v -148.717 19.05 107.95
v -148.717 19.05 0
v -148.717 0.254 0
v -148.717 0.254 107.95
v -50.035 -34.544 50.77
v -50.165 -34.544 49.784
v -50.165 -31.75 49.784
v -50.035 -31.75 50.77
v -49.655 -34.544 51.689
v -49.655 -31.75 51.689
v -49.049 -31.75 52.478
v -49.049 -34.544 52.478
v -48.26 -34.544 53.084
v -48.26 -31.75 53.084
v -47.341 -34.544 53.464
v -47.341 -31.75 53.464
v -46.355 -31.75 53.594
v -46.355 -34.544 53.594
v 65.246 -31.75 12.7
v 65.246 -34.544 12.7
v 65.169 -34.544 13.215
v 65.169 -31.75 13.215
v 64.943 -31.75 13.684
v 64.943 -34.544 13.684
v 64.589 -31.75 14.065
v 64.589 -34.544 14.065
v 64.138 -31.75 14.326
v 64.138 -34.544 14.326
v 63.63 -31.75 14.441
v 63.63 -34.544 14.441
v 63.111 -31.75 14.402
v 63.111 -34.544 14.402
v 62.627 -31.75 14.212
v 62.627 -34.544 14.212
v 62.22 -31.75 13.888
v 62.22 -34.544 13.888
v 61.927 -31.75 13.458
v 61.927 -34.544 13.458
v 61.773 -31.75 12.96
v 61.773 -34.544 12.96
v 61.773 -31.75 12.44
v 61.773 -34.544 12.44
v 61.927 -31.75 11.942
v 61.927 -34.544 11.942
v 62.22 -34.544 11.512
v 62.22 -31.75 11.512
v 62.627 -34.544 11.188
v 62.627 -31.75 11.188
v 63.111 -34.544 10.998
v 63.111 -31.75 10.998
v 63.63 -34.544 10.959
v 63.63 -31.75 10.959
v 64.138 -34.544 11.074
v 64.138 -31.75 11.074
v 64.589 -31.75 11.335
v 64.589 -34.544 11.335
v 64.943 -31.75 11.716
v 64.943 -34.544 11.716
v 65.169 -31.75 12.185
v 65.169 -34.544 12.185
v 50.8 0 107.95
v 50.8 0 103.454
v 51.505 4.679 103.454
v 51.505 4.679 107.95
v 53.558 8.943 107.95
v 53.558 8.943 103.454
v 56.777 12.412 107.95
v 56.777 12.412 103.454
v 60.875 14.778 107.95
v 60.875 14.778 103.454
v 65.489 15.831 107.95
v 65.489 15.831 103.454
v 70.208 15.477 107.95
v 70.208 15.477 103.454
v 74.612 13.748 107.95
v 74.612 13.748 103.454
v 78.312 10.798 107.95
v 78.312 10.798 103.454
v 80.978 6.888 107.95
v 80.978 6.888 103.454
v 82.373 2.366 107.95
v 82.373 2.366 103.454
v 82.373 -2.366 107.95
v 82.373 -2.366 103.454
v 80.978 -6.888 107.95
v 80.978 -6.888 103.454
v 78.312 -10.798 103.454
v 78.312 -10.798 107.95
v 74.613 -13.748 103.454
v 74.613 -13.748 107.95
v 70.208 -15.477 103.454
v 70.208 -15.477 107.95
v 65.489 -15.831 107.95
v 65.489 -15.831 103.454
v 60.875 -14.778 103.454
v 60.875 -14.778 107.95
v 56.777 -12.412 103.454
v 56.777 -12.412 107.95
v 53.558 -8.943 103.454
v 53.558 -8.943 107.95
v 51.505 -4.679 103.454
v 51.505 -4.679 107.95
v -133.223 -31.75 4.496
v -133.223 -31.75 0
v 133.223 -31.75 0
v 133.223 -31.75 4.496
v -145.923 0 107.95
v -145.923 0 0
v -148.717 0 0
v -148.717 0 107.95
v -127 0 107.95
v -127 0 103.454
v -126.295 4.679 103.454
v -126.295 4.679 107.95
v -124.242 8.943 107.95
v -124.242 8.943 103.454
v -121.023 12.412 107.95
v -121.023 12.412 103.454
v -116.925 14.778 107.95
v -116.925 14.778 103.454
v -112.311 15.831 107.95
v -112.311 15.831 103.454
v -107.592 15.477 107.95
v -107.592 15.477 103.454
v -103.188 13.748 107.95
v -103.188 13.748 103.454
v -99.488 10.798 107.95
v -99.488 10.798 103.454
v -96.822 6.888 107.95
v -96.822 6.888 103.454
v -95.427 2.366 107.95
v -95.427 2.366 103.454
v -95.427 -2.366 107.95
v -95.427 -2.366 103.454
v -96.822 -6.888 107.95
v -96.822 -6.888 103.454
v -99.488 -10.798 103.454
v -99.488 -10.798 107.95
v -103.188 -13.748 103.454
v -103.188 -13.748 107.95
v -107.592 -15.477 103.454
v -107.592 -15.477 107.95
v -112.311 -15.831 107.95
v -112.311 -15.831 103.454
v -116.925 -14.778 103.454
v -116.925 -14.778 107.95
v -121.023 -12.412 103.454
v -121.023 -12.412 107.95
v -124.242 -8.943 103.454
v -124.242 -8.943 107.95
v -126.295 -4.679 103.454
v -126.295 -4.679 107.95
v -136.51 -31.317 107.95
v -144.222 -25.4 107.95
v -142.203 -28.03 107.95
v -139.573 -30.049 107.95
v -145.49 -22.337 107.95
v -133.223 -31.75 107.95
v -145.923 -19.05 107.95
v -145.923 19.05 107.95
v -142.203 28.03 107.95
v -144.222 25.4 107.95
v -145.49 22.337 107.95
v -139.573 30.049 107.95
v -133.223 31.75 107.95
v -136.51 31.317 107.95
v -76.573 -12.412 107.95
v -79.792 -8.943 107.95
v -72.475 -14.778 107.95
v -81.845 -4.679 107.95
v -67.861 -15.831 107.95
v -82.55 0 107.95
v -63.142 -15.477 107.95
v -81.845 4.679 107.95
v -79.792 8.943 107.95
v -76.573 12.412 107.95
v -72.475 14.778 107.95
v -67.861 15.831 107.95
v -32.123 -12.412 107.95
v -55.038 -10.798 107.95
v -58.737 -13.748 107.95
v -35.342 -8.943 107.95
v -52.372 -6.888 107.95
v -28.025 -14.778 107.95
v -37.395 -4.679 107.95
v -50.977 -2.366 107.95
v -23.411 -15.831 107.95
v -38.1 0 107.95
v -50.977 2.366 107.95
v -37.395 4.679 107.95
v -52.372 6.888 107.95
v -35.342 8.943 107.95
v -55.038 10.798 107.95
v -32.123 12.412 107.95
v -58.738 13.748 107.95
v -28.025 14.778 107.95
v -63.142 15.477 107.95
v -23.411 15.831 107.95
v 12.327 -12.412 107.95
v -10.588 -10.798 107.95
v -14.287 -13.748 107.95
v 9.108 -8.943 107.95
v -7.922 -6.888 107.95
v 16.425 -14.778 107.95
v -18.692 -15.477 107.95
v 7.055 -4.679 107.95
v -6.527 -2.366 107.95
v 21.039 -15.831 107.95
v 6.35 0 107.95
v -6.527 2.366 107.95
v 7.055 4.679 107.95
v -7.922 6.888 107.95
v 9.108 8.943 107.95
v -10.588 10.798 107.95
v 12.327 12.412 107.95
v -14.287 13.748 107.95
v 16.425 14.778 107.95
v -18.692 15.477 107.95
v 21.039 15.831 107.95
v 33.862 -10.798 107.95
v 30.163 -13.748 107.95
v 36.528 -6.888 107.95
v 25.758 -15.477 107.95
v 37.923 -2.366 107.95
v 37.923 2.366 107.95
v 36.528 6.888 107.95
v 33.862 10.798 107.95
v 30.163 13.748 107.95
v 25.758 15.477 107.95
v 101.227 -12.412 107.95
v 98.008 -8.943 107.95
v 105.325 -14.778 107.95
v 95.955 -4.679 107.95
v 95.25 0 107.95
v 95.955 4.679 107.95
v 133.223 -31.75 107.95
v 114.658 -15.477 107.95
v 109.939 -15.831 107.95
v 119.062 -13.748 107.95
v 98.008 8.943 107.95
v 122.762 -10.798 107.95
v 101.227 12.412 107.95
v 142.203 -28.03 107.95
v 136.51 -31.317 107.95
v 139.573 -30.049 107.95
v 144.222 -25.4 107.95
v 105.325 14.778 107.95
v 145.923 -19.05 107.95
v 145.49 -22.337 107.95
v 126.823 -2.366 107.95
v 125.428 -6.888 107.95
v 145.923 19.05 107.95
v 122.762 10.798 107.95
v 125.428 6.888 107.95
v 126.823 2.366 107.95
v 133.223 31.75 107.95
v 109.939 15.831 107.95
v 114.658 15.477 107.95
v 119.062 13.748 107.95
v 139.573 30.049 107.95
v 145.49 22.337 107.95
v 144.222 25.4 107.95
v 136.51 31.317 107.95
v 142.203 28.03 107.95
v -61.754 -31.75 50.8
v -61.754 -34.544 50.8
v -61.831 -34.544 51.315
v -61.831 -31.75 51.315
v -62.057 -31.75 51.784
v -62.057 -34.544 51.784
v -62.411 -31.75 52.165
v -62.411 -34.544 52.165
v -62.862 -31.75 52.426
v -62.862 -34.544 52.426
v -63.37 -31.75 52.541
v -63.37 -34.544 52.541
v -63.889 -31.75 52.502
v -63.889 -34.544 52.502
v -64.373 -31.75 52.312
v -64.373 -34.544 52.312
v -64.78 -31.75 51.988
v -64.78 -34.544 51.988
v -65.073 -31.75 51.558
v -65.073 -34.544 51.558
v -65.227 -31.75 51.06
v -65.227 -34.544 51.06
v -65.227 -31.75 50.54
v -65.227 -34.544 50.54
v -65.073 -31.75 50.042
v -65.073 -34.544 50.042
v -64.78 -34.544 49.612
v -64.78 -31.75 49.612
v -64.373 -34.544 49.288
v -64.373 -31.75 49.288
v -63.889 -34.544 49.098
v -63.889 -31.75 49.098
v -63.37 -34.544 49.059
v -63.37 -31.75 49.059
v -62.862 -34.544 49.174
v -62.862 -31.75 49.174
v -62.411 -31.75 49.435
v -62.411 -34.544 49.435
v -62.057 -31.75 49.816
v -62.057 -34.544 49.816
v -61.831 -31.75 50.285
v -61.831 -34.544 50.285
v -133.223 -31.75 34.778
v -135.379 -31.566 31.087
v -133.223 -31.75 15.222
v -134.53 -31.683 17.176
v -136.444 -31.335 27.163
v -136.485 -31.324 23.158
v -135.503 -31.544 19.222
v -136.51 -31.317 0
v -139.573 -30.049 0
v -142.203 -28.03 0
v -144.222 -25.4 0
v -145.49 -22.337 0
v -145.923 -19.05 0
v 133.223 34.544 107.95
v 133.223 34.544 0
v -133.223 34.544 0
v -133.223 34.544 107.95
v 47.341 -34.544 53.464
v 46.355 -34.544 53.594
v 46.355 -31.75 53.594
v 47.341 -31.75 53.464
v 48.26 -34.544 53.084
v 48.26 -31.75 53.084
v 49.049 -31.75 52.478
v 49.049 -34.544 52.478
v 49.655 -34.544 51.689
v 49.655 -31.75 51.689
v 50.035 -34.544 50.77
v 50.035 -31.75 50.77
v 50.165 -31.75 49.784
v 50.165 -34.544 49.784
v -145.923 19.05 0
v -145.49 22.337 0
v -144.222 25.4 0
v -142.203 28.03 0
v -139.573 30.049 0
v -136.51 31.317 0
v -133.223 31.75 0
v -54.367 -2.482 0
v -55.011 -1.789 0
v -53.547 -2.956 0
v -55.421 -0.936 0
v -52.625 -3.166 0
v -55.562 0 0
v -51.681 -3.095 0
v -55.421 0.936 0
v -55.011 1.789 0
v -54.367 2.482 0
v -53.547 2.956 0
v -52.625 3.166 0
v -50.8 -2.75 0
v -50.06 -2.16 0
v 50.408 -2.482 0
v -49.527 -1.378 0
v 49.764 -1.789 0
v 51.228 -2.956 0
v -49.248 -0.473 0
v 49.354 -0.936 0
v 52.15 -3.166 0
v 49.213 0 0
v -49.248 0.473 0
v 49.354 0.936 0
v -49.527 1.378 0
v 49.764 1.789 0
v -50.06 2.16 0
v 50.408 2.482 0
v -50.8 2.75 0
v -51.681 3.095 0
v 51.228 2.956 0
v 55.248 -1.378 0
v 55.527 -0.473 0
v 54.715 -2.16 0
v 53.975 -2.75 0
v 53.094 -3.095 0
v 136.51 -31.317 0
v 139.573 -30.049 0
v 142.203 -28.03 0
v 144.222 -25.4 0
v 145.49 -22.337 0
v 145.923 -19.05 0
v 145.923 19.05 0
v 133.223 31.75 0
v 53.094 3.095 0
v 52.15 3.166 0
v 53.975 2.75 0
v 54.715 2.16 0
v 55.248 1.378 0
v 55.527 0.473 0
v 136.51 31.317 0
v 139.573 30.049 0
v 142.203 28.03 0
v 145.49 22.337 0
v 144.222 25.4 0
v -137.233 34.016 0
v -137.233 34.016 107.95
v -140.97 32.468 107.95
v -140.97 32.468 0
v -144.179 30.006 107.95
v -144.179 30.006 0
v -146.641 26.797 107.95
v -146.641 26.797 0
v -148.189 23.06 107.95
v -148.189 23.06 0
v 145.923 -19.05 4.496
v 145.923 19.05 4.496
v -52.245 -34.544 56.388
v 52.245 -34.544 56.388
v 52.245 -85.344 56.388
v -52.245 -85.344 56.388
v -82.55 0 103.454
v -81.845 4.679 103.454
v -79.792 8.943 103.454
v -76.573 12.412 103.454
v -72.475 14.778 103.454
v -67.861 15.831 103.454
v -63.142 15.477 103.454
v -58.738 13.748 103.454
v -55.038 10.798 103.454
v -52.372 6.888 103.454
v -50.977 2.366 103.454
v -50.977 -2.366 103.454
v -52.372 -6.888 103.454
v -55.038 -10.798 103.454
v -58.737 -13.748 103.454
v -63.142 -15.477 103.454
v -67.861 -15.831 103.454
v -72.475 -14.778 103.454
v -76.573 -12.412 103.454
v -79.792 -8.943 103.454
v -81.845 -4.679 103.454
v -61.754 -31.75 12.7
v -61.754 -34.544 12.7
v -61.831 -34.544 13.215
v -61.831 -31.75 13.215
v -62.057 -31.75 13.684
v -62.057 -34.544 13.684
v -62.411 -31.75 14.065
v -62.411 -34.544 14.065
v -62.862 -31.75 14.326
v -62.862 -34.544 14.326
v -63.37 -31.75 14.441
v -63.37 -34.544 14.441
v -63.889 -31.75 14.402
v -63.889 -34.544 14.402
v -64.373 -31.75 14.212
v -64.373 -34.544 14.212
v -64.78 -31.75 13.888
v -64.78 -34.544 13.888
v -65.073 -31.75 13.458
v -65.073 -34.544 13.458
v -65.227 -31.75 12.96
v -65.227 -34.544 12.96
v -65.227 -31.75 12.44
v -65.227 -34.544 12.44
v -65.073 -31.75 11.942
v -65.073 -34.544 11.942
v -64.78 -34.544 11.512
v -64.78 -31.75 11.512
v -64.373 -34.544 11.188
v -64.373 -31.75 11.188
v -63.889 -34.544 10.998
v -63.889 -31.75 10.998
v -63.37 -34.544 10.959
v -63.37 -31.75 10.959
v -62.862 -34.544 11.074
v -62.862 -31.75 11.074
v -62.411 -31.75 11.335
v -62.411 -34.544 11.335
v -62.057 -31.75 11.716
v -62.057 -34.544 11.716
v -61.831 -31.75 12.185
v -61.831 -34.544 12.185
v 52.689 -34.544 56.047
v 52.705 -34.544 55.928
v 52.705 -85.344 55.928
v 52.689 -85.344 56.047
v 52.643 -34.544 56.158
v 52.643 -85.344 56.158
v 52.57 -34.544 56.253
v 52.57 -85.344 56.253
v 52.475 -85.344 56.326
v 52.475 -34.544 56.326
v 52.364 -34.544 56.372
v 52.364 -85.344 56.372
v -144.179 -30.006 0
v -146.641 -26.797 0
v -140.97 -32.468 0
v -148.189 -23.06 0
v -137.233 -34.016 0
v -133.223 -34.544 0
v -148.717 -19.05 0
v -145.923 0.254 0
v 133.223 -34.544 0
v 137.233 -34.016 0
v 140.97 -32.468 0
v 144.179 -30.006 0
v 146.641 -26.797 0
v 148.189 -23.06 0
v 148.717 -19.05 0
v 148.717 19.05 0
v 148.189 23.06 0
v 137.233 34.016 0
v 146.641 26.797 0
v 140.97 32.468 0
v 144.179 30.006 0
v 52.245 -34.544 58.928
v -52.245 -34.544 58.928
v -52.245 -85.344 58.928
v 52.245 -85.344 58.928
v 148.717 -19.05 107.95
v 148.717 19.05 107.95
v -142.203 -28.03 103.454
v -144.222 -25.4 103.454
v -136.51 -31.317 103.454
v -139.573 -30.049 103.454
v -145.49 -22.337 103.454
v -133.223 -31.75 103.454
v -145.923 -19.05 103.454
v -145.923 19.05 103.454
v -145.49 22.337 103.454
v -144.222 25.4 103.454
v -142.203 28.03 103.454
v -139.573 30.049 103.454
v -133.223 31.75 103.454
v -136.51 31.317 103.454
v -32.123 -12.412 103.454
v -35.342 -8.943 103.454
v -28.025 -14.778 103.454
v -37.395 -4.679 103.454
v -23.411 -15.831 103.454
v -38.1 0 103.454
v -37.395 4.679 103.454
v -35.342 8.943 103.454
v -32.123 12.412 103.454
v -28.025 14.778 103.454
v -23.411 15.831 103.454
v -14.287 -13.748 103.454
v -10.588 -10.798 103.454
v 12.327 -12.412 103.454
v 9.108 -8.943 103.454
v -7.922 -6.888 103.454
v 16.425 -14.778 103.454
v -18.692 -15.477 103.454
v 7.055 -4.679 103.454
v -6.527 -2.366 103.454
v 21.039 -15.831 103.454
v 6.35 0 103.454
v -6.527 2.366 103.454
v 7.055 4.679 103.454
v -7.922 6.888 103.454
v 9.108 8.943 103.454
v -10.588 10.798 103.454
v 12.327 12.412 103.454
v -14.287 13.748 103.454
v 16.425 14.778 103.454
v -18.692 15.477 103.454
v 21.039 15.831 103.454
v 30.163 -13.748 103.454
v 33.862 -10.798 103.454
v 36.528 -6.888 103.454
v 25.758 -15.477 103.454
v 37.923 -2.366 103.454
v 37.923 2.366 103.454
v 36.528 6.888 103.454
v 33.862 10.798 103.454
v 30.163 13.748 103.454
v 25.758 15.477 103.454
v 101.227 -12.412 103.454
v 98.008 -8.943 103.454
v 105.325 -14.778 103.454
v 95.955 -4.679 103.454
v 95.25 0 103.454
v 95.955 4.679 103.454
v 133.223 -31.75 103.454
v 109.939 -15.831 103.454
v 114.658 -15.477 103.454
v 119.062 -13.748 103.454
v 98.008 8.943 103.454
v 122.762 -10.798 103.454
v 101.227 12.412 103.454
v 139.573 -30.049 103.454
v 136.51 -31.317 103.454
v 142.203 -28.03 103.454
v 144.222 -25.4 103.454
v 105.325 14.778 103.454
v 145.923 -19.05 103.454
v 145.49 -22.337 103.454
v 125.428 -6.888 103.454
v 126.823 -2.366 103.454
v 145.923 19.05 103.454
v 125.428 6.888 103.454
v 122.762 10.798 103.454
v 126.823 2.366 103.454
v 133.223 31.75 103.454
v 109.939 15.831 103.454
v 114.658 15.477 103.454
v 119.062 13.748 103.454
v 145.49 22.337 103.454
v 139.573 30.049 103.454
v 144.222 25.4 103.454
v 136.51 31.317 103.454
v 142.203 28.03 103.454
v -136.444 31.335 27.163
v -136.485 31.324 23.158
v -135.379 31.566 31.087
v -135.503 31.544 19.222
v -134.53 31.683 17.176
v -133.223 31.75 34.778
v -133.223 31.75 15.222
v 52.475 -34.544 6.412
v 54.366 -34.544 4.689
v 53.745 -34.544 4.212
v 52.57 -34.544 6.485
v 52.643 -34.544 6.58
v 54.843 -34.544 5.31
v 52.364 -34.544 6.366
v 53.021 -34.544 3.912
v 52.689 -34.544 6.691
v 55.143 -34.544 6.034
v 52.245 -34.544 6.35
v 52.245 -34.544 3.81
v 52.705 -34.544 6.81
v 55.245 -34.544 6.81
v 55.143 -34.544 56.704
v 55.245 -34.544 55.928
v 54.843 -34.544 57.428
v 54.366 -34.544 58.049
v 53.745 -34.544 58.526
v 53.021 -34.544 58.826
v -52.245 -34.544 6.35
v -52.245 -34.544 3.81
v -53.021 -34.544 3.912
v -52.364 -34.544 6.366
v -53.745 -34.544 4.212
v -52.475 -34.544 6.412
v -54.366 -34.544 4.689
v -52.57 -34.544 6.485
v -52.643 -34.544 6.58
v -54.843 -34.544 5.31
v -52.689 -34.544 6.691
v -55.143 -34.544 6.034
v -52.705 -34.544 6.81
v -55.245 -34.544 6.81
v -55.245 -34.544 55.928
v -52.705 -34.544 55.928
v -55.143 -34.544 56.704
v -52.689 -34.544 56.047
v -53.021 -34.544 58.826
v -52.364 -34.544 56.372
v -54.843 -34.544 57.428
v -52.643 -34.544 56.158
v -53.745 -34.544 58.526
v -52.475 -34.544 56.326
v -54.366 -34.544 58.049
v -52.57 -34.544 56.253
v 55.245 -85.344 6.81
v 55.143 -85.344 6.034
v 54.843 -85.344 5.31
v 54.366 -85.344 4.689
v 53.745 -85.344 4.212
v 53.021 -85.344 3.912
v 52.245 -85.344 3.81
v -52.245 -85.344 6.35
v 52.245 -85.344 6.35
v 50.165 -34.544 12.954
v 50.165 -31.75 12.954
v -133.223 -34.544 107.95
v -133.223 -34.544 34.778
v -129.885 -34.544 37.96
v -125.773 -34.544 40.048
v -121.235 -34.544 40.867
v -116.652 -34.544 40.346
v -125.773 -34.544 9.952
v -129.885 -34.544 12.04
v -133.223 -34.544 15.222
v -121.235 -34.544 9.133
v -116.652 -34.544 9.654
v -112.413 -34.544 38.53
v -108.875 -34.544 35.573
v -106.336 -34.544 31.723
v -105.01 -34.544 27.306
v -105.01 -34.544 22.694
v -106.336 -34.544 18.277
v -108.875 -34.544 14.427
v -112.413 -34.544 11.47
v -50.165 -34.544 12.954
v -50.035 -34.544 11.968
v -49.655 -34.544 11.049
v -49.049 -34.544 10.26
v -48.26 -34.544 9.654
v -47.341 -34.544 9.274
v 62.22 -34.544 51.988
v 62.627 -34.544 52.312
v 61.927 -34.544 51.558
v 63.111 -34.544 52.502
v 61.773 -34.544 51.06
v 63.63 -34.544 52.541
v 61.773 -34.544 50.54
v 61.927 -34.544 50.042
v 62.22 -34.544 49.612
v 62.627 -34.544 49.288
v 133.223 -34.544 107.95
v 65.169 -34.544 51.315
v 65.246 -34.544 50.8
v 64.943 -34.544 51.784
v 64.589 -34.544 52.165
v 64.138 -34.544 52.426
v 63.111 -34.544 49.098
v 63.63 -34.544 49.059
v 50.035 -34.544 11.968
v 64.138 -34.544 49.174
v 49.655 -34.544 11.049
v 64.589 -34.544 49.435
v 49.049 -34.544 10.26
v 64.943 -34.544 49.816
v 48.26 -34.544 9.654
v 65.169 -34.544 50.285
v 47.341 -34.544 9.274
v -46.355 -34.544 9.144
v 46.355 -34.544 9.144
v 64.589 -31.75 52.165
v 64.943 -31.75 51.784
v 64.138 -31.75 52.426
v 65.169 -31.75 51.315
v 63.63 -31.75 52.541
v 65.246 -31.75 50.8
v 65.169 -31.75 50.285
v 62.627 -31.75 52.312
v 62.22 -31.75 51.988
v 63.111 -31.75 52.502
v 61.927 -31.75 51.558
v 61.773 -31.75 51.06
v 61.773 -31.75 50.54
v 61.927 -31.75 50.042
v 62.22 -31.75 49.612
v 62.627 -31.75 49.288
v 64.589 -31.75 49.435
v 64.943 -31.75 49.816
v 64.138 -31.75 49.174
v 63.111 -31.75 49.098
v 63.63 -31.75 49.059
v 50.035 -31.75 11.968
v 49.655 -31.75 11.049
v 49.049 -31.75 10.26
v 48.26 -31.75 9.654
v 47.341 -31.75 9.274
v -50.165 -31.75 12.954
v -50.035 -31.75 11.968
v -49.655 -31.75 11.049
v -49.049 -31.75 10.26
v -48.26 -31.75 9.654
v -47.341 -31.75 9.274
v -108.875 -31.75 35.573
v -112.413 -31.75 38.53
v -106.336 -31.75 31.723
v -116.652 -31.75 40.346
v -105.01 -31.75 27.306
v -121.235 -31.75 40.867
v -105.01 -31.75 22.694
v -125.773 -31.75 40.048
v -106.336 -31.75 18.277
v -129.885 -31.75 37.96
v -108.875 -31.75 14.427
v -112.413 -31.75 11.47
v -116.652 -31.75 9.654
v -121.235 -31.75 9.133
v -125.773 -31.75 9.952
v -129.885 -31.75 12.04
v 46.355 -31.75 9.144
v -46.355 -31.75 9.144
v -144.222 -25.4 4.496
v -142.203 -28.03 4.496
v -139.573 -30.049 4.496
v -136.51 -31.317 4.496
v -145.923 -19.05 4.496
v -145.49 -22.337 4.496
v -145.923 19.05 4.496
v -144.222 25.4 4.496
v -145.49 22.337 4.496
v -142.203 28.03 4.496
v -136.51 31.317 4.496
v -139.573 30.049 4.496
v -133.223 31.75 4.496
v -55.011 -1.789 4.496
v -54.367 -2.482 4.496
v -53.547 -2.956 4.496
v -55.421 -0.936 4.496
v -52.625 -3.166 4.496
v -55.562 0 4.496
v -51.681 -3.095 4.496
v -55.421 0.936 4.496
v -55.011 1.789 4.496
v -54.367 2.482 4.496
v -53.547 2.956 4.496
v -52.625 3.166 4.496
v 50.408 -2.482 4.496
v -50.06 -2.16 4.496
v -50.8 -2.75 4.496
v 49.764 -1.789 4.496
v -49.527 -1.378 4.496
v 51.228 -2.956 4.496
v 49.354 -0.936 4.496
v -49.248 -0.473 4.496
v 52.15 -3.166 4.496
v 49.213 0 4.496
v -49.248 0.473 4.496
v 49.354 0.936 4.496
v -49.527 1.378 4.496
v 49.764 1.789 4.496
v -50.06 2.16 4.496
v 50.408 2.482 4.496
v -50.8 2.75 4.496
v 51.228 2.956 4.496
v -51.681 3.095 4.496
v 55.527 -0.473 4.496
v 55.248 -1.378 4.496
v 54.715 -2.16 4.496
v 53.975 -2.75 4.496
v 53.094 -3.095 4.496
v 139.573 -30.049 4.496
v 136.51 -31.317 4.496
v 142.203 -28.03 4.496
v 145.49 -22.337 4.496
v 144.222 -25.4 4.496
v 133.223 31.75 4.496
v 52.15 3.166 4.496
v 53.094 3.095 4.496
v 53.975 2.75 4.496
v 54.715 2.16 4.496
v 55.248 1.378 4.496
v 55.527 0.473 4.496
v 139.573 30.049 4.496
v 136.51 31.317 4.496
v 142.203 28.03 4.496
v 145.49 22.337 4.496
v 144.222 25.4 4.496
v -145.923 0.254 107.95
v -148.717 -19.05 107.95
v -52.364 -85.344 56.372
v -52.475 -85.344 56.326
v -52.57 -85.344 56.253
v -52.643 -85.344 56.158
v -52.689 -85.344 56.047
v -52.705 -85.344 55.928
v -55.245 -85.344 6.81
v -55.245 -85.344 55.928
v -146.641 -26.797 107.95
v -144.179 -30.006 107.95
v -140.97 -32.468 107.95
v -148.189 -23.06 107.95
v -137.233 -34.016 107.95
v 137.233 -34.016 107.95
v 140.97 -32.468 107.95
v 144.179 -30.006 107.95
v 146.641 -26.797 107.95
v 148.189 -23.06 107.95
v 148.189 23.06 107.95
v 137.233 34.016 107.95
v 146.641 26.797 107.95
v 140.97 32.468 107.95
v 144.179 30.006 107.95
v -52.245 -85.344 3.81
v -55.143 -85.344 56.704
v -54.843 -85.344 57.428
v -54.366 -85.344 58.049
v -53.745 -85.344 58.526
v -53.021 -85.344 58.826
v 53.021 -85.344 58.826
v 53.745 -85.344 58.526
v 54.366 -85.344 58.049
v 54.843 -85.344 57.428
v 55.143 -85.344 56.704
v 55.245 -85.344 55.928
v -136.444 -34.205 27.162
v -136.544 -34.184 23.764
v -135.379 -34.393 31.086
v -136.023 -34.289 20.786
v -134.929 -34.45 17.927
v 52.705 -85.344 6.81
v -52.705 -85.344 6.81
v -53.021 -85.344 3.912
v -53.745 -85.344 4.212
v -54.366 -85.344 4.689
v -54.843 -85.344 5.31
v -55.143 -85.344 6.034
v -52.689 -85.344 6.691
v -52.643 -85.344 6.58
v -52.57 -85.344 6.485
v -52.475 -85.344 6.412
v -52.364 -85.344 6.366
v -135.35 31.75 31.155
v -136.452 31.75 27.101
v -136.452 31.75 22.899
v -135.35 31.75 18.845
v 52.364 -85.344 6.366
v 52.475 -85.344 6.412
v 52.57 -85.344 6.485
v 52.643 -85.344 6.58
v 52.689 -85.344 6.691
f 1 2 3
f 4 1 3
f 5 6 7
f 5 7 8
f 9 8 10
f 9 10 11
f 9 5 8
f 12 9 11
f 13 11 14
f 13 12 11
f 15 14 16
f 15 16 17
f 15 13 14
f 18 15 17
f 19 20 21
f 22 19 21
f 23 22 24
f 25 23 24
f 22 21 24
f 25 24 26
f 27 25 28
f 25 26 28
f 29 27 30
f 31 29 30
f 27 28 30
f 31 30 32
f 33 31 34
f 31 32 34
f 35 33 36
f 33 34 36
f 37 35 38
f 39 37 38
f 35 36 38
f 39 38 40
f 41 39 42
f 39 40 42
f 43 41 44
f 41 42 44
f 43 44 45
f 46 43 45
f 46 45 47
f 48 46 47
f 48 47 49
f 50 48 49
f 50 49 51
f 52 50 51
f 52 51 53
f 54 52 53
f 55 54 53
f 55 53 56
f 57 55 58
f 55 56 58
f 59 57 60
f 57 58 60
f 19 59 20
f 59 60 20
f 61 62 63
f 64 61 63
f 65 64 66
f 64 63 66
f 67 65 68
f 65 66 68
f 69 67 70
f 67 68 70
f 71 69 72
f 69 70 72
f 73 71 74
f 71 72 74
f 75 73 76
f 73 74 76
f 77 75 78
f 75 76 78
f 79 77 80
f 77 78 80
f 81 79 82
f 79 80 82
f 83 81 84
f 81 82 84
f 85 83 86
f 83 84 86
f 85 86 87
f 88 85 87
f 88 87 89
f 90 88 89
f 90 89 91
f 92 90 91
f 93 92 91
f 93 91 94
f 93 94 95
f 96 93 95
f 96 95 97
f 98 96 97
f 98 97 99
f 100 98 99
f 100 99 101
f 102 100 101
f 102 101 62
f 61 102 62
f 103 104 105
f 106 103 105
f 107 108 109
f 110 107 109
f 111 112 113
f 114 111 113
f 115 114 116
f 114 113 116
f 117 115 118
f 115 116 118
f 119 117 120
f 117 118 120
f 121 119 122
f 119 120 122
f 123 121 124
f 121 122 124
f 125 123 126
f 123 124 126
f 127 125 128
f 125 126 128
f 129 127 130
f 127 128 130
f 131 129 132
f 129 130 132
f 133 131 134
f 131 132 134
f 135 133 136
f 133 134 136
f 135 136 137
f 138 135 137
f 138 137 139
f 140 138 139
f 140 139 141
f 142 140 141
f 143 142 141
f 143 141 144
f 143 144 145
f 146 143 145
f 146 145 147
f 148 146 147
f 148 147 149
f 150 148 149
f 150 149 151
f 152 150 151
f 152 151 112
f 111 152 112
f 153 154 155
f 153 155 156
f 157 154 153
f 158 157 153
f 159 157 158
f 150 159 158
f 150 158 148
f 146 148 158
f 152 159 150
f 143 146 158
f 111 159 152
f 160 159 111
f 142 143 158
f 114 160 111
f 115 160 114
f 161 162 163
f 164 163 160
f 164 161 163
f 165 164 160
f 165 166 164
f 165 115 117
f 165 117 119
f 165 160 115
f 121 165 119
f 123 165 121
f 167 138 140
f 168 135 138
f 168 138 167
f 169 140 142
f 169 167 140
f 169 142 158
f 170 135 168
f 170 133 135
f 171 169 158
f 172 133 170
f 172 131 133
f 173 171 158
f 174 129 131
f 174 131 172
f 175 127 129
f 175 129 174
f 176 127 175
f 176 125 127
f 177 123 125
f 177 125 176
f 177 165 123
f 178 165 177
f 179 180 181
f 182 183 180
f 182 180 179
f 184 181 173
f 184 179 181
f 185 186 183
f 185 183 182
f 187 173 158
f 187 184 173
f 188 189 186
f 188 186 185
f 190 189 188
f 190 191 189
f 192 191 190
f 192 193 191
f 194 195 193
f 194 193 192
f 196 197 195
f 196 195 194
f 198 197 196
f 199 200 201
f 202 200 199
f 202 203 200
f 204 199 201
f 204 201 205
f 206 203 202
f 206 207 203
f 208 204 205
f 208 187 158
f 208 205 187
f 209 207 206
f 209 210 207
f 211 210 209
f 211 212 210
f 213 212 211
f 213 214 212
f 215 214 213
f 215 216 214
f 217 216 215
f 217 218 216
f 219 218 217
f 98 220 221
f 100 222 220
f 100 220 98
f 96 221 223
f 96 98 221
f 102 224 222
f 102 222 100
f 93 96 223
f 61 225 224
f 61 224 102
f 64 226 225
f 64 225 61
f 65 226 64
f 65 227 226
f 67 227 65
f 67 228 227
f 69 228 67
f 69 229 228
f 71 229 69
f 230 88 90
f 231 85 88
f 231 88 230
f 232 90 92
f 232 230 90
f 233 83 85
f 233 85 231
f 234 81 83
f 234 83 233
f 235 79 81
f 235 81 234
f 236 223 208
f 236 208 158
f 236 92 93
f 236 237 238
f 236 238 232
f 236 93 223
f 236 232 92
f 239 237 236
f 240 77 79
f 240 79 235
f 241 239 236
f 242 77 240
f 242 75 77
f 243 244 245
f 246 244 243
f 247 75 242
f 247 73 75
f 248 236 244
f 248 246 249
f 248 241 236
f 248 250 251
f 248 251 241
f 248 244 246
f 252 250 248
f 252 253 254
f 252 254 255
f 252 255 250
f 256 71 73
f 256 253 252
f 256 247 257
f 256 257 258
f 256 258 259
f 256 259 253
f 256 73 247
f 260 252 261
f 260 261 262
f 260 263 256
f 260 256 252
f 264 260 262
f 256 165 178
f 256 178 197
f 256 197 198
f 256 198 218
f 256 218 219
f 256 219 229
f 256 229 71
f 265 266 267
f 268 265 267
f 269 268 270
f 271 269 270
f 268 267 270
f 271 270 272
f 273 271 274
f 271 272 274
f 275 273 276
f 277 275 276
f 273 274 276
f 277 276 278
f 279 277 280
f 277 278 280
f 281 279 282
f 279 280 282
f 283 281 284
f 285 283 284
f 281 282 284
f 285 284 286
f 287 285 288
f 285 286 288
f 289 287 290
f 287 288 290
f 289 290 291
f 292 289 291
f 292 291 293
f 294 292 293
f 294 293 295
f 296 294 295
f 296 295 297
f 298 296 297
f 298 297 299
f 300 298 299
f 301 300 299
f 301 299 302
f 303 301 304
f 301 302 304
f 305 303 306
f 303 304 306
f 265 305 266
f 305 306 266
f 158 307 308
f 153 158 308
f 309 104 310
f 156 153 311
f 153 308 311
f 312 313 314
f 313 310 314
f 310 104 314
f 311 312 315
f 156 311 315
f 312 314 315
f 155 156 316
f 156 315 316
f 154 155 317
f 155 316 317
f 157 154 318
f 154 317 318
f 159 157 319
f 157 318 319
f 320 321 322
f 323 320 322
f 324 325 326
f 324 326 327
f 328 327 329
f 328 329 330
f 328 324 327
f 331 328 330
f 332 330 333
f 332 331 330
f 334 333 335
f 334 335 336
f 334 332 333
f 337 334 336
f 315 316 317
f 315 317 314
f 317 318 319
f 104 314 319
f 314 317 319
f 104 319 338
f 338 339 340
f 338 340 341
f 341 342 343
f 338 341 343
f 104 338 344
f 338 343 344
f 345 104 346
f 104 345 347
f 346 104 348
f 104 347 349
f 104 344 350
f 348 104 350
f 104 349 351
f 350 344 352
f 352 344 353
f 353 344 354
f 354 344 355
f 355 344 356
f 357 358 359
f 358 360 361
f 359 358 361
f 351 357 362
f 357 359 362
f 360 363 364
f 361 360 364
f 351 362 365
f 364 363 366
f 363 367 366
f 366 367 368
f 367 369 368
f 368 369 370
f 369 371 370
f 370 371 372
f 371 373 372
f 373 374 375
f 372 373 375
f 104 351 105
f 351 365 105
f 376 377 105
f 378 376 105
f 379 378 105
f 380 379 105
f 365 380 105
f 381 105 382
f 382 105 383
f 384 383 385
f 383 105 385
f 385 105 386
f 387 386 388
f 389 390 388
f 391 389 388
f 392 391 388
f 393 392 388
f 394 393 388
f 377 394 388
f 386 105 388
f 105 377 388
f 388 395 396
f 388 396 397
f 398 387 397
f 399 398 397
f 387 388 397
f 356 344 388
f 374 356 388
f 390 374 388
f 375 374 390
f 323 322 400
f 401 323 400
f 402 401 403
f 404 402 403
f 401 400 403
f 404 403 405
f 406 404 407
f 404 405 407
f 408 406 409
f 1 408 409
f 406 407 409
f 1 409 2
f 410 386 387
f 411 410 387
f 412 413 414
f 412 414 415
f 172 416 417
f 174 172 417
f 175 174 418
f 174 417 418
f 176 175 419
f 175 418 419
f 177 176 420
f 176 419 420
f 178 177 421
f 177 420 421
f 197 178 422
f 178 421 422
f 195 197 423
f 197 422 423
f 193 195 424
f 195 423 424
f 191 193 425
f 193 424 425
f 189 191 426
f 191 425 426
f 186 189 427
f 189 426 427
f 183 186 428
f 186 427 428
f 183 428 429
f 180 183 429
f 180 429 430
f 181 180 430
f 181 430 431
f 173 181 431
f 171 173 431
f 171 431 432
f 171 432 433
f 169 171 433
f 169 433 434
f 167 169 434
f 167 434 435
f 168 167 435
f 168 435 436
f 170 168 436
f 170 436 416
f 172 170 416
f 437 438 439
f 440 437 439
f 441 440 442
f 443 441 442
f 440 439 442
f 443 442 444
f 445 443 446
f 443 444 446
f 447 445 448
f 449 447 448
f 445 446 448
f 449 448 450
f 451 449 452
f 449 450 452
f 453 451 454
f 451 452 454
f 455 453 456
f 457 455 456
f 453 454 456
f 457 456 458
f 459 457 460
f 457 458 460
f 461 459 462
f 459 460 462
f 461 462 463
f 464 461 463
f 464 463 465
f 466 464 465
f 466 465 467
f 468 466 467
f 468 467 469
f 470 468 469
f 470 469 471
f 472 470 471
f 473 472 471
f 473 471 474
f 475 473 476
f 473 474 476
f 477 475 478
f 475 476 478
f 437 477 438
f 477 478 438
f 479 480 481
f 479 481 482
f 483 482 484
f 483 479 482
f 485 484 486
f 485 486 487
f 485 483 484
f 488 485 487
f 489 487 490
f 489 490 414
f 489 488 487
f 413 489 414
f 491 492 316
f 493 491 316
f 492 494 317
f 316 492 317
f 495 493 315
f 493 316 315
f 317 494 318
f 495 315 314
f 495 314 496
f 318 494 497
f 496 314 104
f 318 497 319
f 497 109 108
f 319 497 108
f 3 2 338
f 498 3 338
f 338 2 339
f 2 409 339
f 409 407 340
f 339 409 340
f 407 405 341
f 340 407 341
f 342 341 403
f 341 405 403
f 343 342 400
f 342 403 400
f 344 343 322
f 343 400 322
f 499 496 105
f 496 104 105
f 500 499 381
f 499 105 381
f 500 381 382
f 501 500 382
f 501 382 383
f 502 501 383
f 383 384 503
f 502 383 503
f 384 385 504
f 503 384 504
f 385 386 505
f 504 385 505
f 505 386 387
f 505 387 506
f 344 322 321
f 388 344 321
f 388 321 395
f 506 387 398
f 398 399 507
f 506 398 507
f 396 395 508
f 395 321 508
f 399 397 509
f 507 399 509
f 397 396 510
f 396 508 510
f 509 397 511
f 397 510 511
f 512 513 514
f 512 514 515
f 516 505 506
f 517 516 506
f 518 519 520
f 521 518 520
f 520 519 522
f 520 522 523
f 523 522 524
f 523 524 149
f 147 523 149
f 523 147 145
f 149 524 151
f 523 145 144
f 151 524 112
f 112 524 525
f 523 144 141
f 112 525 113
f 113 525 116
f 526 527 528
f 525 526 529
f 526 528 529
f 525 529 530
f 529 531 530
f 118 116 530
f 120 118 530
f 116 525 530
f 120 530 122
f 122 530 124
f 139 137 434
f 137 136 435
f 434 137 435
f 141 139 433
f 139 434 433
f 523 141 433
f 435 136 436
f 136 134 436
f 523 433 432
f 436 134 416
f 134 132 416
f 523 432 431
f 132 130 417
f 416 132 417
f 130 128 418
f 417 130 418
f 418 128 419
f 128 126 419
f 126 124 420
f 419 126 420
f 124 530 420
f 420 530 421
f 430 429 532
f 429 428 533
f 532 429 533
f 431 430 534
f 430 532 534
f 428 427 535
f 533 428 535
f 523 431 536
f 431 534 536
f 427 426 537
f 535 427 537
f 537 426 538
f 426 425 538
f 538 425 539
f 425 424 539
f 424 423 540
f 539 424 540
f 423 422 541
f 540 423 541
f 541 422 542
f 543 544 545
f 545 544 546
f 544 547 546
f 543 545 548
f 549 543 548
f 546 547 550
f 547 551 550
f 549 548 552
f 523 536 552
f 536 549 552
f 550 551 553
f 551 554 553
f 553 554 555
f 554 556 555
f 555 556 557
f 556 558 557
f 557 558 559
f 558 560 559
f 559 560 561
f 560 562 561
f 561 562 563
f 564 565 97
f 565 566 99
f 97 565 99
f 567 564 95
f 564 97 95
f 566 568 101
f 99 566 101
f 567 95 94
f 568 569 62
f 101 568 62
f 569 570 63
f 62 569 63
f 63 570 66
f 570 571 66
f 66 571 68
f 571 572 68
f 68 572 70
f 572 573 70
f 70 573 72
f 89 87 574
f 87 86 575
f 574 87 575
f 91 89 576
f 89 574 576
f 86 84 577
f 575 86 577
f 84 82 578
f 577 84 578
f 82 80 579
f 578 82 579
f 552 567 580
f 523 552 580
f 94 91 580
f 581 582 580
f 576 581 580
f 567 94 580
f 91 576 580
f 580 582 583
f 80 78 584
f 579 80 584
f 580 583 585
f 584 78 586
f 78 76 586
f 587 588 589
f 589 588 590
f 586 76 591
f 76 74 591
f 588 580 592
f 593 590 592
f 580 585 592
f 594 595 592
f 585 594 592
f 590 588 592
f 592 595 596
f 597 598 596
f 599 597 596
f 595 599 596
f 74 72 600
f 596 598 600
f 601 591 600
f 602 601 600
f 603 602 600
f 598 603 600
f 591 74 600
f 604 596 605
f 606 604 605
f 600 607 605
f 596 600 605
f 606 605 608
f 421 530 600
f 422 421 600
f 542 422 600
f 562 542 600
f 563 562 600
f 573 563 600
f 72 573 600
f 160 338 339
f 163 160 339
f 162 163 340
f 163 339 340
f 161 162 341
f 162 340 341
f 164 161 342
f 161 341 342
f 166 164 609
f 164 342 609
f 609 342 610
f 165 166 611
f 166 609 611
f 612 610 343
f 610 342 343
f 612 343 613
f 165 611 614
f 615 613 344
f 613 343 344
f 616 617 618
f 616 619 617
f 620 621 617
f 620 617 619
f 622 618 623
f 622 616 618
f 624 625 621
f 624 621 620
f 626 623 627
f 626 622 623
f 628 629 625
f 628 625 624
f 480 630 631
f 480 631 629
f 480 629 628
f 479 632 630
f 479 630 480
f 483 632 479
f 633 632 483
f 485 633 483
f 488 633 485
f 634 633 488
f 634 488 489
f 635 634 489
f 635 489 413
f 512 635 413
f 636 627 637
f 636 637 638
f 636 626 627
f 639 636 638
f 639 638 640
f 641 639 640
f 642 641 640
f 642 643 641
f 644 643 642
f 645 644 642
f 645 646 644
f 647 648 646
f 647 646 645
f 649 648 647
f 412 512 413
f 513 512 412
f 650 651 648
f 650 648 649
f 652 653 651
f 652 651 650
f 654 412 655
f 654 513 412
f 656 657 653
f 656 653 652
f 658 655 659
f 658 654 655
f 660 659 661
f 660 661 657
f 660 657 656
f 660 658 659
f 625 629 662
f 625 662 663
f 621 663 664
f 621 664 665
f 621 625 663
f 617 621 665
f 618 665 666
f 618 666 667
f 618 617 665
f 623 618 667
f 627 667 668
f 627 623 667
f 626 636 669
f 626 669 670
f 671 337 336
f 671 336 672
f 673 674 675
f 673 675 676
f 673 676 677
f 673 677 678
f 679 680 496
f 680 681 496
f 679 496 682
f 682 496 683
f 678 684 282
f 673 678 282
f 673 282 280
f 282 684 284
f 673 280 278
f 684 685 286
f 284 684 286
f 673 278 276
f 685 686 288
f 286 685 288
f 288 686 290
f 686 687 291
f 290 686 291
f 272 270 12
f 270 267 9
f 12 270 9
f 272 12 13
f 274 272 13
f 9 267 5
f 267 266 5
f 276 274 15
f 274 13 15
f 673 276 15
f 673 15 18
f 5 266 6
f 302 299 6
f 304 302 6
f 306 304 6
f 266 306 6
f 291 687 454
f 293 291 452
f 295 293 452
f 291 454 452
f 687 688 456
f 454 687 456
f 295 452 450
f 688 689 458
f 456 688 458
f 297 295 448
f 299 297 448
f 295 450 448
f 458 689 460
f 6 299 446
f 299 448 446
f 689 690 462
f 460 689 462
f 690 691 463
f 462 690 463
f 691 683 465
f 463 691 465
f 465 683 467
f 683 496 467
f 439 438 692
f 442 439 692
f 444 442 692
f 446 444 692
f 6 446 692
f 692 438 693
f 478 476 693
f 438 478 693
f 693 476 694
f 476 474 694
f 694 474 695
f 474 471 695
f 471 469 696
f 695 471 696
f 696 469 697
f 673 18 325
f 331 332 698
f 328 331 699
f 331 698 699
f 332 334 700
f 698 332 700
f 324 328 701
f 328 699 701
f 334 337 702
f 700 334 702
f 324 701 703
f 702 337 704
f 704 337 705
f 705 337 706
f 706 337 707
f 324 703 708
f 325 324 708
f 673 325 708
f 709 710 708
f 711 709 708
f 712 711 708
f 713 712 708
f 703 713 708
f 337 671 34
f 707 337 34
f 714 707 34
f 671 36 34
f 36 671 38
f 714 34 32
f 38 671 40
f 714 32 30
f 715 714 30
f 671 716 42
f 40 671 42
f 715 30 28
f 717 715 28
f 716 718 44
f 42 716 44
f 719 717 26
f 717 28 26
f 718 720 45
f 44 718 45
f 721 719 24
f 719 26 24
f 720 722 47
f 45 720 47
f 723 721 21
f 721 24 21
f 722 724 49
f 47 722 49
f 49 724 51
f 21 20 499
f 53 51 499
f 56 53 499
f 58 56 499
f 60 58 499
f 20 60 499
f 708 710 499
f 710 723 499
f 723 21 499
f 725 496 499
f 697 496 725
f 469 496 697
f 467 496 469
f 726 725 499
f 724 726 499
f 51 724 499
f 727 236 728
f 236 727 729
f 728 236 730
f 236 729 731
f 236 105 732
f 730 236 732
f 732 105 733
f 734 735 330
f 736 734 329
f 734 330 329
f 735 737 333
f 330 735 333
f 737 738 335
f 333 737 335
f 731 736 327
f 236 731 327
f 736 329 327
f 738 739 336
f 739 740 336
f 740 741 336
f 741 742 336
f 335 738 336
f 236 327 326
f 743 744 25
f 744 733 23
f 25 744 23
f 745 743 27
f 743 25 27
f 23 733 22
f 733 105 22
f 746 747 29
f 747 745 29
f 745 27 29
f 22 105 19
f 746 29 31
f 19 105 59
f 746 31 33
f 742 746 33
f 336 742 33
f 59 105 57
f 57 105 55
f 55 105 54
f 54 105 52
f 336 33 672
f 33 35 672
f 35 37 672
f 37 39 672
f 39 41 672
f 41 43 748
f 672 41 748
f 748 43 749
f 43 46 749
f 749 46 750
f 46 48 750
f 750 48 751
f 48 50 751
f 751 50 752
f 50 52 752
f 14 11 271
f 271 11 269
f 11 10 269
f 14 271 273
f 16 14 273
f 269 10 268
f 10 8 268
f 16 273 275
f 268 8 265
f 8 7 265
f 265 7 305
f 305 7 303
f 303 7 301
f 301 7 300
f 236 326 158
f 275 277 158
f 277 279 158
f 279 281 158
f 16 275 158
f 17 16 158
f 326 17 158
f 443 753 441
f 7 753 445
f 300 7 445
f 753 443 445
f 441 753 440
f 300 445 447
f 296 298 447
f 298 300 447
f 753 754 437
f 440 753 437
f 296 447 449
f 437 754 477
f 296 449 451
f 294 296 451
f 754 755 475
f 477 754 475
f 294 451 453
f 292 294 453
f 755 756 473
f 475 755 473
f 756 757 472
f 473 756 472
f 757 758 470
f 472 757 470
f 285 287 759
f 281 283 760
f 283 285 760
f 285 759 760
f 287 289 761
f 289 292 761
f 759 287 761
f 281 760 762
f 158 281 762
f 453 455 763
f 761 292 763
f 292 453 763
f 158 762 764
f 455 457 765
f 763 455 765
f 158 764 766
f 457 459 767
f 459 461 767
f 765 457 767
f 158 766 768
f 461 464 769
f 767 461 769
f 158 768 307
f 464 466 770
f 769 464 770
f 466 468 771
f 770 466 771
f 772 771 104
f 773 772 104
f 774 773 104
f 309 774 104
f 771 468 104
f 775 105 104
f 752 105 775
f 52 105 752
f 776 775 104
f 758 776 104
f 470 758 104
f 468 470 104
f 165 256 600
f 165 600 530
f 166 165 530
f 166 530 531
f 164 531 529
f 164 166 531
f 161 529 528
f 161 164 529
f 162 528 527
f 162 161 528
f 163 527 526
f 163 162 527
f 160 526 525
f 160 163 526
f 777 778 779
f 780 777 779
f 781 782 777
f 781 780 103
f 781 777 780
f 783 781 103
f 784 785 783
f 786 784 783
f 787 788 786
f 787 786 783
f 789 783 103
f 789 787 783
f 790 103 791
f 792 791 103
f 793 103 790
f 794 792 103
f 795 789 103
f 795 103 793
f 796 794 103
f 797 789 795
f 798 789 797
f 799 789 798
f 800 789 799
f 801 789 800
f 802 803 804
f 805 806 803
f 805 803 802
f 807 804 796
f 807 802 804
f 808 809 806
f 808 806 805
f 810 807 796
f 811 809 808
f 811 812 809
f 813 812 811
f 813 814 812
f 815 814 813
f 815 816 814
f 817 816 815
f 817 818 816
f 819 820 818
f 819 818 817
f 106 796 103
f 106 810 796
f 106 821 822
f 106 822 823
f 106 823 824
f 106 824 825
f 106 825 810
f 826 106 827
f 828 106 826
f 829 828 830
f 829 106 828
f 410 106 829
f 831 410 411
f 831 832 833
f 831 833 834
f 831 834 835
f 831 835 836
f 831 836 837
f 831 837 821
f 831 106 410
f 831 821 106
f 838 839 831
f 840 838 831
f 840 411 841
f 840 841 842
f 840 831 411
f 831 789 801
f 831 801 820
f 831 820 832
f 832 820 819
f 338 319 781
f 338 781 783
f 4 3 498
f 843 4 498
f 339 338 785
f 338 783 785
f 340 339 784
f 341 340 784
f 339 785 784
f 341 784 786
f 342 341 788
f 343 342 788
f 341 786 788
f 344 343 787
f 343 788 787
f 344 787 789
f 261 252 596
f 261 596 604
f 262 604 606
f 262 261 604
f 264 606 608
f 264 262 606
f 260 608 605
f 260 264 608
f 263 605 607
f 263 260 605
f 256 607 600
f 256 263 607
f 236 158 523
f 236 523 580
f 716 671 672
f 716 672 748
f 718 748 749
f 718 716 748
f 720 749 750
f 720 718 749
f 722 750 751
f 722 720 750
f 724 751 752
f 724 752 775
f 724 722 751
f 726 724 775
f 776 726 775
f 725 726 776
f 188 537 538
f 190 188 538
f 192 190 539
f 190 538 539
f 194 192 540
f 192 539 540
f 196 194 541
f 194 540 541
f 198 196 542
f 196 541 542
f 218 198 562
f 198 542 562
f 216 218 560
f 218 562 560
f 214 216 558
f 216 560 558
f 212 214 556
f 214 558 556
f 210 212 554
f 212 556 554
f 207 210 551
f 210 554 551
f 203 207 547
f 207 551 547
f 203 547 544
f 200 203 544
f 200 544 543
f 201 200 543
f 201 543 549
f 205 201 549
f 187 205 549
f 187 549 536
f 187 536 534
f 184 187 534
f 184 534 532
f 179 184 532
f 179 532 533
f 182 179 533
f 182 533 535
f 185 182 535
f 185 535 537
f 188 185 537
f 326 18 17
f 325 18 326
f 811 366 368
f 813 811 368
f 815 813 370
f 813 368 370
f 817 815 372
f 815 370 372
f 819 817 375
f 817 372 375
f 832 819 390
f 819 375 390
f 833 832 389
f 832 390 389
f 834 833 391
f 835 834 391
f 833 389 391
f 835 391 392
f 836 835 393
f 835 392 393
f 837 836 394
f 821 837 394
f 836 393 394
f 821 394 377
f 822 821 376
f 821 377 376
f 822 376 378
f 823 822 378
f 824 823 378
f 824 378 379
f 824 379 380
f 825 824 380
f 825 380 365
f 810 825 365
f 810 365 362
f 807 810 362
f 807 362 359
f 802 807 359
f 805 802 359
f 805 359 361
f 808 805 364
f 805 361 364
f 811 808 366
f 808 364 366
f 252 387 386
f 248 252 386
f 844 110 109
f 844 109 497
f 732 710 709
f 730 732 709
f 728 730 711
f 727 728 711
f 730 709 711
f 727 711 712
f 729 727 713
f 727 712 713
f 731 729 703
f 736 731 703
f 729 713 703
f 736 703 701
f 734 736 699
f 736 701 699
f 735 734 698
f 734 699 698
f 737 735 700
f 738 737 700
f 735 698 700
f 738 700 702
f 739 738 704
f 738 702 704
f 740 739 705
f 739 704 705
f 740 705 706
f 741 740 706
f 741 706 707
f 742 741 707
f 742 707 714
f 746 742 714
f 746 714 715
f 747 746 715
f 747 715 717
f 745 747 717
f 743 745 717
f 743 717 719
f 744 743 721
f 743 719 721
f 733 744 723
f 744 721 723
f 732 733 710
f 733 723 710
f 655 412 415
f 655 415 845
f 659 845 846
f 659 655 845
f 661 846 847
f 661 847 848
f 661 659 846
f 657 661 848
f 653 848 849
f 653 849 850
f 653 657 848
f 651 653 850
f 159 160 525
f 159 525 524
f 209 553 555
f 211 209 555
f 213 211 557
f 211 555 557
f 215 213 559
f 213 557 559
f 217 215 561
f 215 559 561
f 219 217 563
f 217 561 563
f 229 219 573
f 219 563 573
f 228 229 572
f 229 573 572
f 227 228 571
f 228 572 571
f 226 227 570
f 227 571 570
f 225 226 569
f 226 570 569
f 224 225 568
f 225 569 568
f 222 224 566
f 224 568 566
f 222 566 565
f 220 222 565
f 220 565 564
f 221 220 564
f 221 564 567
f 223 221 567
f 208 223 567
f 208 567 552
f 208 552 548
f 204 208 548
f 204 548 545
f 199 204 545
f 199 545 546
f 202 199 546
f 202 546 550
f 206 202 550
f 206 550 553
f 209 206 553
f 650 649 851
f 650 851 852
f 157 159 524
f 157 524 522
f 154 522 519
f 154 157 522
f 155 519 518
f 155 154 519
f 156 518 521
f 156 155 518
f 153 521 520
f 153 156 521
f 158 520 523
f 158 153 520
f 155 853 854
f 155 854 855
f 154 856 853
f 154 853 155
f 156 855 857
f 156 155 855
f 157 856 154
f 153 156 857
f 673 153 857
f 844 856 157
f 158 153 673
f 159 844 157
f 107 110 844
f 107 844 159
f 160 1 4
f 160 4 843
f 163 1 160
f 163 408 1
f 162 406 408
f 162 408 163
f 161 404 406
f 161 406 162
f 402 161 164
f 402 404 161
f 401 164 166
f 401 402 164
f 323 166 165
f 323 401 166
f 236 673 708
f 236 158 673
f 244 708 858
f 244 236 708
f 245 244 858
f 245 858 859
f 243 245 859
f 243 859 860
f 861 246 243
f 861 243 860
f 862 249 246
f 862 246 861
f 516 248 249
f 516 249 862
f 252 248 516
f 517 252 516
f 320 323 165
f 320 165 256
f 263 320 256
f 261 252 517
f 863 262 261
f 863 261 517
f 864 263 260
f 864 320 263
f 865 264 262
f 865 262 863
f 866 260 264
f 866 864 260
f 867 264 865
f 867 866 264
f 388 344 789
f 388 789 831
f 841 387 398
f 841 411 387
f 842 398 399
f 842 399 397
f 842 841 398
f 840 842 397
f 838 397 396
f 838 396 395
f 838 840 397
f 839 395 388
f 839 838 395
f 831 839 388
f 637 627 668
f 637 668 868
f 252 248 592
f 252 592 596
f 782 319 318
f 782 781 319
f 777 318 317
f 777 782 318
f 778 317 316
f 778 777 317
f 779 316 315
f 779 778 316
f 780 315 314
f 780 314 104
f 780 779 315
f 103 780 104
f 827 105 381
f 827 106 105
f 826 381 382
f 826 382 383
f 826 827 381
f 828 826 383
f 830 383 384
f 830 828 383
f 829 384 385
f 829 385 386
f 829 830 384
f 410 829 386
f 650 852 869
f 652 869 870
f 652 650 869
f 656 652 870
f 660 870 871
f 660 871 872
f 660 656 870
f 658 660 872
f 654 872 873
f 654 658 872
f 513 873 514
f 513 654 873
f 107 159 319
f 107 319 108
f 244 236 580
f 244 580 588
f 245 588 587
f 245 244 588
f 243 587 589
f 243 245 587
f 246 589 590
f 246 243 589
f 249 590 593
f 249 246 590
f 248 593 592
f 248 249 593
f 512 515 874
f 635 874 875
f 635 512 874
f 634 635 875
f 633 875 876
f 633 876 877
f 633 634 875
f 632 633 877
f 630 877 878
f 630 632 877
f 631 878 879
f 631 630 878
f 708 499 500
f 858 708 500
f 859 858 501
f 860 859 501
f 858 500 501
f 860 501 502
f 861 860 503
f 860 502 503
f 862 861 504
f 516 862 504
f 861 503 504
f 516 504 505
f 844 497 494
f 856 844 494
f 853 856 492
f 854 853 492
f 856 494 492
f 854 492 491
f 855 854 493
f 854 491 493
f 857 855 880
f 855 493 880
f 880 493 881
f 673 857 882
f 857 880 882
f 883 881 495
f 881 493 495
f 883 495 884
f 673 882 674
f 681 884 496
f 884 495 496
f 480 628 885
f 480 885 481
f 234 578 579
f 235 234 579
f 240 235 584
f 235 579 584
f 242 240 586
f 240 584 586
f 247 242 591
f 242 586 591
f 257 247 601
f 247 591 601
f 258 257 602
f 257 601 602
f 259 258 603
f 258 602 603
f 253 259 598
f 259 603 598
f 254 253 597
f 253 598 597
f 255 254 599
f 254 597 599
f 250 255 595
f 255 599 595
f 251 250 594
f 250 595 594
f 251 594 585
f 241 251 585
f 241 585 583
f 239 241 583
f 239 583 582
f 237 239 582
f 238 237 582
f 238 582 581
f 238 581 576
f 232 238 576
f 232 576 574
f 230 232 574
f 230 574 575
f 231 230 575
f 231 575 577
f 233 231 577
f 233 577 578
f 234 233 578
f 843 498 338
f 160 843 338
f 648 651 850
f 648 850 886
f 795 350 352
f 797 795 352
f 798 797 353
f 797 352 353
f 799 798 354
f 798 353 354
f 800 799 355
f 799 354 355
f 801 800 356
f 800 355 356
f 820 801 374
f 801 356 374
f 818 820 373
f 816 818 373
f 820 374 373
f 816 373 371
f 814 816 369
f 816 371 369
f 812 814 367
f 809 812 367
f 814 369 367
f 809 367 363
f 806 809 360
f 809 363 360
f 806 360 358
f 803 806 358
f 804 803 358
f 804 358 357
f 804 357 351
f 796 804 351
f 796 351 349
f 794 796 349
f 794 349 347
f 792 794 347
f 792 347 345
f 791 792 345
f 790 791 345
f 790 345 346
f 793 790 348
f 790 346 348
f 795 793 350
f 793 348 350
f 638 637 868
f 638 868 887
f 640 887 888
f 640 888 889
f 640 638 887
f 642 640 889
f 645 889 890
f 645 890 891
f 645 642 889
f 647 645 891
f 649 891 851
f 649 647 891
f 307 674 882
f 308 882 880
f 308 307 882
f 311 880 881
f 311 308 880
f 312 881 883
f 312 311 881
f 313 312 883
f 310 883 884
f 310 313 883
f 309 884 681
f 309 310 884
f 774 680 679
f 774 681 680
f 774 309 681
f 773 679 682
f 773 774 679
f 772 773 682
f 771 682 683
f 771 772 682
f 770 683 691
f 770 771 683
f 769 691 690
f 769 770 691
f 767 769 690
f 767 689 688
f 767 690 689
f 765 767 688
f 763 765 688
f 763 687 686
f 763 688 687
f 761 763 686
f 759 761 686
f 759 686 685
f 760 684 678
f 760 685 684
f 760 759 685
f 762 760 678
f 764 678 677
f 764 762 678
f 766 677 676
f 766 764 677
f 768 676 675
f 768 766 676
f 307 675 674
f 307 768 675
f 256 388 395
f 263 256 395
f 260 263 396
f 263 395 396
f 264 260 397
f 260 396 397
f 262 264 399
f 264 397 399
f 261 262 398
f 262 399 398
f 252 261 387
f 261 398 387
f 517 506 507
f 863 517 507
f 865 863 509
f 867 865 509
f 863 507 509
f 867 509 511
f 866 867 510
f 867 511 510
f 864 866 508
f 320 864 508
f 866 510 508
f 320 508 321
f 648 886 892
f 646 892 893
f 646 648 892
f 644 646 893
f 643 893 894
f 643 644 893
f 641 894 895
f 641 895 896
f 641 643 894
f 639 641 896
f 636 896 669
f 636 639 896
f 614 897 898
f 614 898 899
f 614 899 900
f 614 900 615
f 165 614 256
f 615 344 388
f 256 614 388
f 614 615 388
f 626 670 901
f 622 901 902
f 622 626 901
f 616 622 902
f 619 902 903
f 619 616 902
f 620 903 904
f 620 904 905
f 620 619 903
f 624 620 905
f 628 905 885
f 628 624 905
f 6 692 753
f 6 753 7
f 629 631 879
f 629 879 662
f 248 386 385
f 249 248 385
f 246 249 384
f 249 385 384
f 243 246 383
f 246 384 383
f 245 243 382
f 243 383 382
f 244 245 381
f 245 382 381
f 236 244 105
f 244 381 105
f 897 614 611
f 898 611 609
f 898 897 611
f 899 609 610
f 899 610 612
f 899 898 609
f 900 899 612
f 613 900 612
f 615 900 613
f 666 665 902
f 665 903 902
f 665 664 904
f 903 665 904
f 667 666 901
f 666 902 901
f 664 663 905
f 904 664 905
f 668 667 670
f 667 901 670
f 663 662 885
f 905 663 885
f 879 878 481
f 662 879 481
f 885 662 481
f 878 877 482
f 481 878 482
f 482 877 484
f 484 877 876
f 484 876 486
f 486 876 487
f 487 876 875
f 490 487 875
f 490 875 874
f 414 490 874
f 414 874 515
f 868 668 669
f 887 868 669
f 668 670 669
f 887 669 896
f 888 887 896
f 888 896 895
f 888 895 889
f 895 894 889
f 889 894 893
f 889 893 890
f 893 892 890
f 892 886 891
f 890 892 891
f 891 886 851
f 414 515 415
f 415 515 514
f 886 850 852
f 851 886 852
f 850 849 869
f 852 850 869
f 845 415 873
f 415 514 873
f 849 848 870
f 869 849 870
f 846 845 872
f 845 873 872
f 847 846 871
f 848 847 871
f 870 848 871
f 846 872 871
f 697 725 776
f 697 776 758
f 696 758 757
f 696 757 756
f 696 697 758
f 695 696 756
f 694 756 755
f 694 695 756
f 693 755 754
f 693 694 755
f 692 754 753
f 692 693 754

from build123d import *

# Parameters (mm, degrees)
SKETCH1_W           = 291.846
SKETCH1_H           = 63.5
BOSS_EXTRUDE1_DEPTH = 4.4958
FILLET1_R           = 12.7
BOSS_EXTRUDE2_DEPTH = 107.95
BOSS_EXTRUDE3_DEPTH = 4.4958
SKETCH2_R           = 15.875
CUT_EXTRUDE1_DEPTH  = 187.984589004
BOSS_EXTRUDE5_DEPTH = 50.8
SKETCH7_R           = 3.175
CUT_EXTRUDE2_DEPTH  = 4.4958
CUT_EXTRUDE3_DEPTH  = 2.794
CUT_EXTRUDE4_START  = -66.294
SKETCH9_R           = 15.875
CUT_EXTRUDE4_DEPTH  = 263.617967801
SKETCH10_R          = 1.74625
CUT_EXTRUDE5_DEPTH  = 2.794


with BuildPart() as part:
    # Sketch1 → Boss-Extrude1 (new body)
    with BuildSketch(Plane.XY):
        Rectangle(SKETCH1_W, SKETCH1_H)
    extrude(amount=BOSS_EXTRUDE1_DEPTH)

    # Fillet1
    fillet1_edges = [part.edges().sort_by_distance(p)[0] for p in [
        (145.923, -31.75, 2.2479),
        (-145.923, -31.75, 2.2479),
        (-145.923, 31.75, 2.2479),
        (145.923, 31.75, 2.2479),
    ]]
    fillet(fillet1_edges, radius=FILLET1_R)

    # Sketch7 → Cut-Extrude2 (cut)
    with BuildSketch(Plane(origin=(0, 0, 0), x_dir=(-1, 0, 0), z_dir=(0, 0, -1))):
        with Locations((-52.3875, 0)):
            Circle(SKETCH7_R)
        with Locations((52.3875, 0)):
            Circle(SKETCH7_R)
    extrude(amount=-CUT_EXTRUDE2_DEPTH, mode=Mode.SUBTRACT)


with BuildPart() as body_2:
    # Sketch3 → Boss-Extrude2 (new body)
    with BuildSketch(Plane.XY):
        with BuildLine():
            Line((133.223, 34.544), (-133.223, 34.544))
            ThreePointArc((-133.223, 34.544), (-144.178912468, 30.005912468), (-148.717, 19.05))
            Line((-148.717, 19.05), (-148.717, 0.254))
            Line((-148.717, 0.254), (-145.923, 0.254))
            Line((-145.923, 0.254), (-145.923, 19.05))
            ThreePointArc((-145.923, 19.05), (-142.203256121, 28.030256121), (-133.223, 31.75))
            Line((-133.223, 31.75), (133.223, 31.75))
            ThreePointArc((133.223, 31.75), (142.203256121, 28.030256121), (145.923, 19.05))
            Line((145.923, 19.05), (145.923, -19.05))
            ThreePointArc((145.923, -19.05), (142.203256121, -28.030256121), (133.223, -31.75))
            Line((133.223, -31.75), (-133.223, -31.75))
            ThreePointArc((-133.223, -31.75), (-142.203256121, -28.030256121), (-145.923, -19.05))
            Line((-145.923, -19.05), (-145.923, 0))
            Line((-145.923, 0), (-148.717, 0))
            Line((-148.717, 0), (-148.717, -19.05))
            ThreePointArc((-148.717, -19.05), (-144.178912468, -30.005912468), (-133.223, -34.544))
            Line((-133.223, -34.544), (133.223, -34.544))
            ThreePointArc((133.223, -34.544), (144.178912468, -30.005912468), (148.717, -19.05))
            Line((148.717, -19.05), (148.717, 19.05))
            ThreePointArc((148.717, 19.05), (144.178912468, 30.005912468), (133.223, 34.544))
        make_face()
    extrude(amount=BOSS_EXTRUDE2_DEPTH)

    # Sketch8 → Cut-Extrude3 (cut)
    with BuildSketch(Plane.XZ.offset(34.544)):
        with BuildLine():
            Line((-46.355, 53.594), (46.355, 53.594))
            ThreePointArc((46.355, 53.594), (49.049076836, 52.478076836), (50.165, 49.784))
            Line((50.165, 49.784), (50.165, 12.954))
            ThreePointArc((50.165, 12.954), (49.049076836, 10.259923164), (46.355, 9.144))
            Line((46.355, 9.144), (-46.355, 9.144))
            ThreePointArc((-46.355, 9.144), (-49.049076836, 10.259923164), (-50.165, 12.954))
            Line((-50.165, 12.954), (-50.165, 49.784))
            ThreePointArc((-50.165, 49.784), (-49.049076836, 52.478076836), (-46.355, 53.594))
        make_face()
    extrude(amount=-CUT_EXTRUDE3_DEPTH, mode=Mode.SUBTRACT)

    # Sketch9 → Cut-Extrude4 (cut, through all)
    with BuildSketch(Plane.XZ.offset(34.544).offset(CUT_EXTRUDE4_START)):
        with Locations(Location((-120.717, 25, 0), (0, 0, 141.978486401))):
            Circle(SKETCH9_R)
    extrude(amount=CUT_EXTRUDE4_DEPTH, mode=Mode.SUBTRACT)

    # Sketch10 → Cut-Extrude5 (cut)
    with BuildSketch(Plane.XZ.offset(34.544)):
        with Locations((63.5, 50.8)):
            Circle(SKETCH10_R)
        with Locations((63.5, 12.7)):
            Circle(SKETCH10_R)
        with Locations((-63.5, 50.8)):
            Circle(SKETCH10_R)
        with Locations((-63.5, 12.7)):
            Circle(SKETCH10_R)
    extrude(amount=-CUT_EXTRUDE5_DEPTH, mode=Mode.SUBTRACT)


with BuildPart() as body_3:
    # Sketch4 → Boss-Extrude3 (new body)
    with BuildSketch(Plane.XY.offset(107.95)):
        with BuildLine():
            Line((-145.923, 19.05), (-145.923, -19.05))
            ThreePointArc((-145.923, -19.05), (-142.203256121, -28.030256121), (-133.223, -31.75))
            Line((-133.223, -31.75), (133.223, -31.75))
            ThreePointArc((133.223, -31.75), (142.203256121, -28.030256121), (145.923, -19.05))
            Line((145.923, -19.05), (145.923, 19.05))
            ThreePointArc((145.923, 19.05), (142.203256121, 28.030256121), (133.223, 31.75))
            Line((133.223, 31.75), (-133.223, 31.75))
            ThreePointArc((-133.223, 31.75), (-142.203256121, 28.030256121), (-145.923, 19.05))
        make_face()
    extrude(amount=-BOSS_EXTRUDE3_DEPTH)

    # Sketch2 → Cut-Extrude1 (cut, through all)
    with BuildSketch(Plane(origin=(0, 0, 0), x_dir=(-1, 0, 0), z_dir=(0, 0, -1))):
        with Locations((-111.125, 0)):
            Circle(SKETCH2_R)
        with Locations((-66.675, 0)):
            Circle(SKETCH2_R)
        with Locations((-22.225, 0)):
            Circle(SKETCH2_R)
        with Locations((22.225, 0)):
            Circle(SKETCH2_R)
        with Locations((66.675, 0)):
            Circle(SKETCH2_R)
        with Locations((111.125, 0)):
            Circle(SKETCH2_R)
    extrude(amount=-CUT_EXTRUDE1_DEPTH, mode=Mode.SUBTRACT)


with BuildPart() as body_4:
    # Sketch6 → Boss-Extrude5 (new body)
    with BuildSketch(Plane.XZ.offset(34.544)):
        with BuildLine():
            Line((-52.245, 58.928), (52.245, 58.928))
            ThreePointArc((52.245, 58.928), (54.366320344, 58.049320344), (55.245, 55.928))
            Line((55.245, 55.928), (55.245, 6.81))
            ThreePointArc((55.245, 6.81), (54.366320344, 4.688679656), (52.245, 3.81))
            Line((52.245, 3.81), (-52.245, 3.81))
            ThreePointArc((-52.245, 3.81), (-54.366320344, 4.688679656), (-55.245, 6.81))
            Line((-55.245, 6.81), (-55.245, 55.928))
            ThreePointArc((-55.245, 55.928), (-54.366320344, 58.049320344), (-52.245, 58.928))
        make_face()
        with BuildLine():
            Line((-52.705, 55.928), (-52.705, 6.81))
            ThreePointArc((-52.705, 6.81), (-52.570269119, 6.484730881), (-52.245, 6.35))
            Line((-52.245, 6.35), (52.245, 6.35))
            ThreePointArc((52.245, 6.35), (52.570269119, 6.484730881), (52.705, 6.81))
            Line((52.705, 6.81), (52.705, 55.928))
            ThreePointArc((52.705, 55.928), (52.570269119, 56.253269119), (52.245, 56.388))
            Line((52.245, 56.388), (-52.245, 56.388))
            ThreePointArc((-52.245, 56.388), (-52.570269119, 56.253269119), (-52.705, 55.928))
        make_face(mode=Mode.SUBTRACT)
    extrude(amount=BOSS_EXTRUDE5_DEPTH)


solid = Compound([part.part, body_2.part, body_3.part, body_4.part])
